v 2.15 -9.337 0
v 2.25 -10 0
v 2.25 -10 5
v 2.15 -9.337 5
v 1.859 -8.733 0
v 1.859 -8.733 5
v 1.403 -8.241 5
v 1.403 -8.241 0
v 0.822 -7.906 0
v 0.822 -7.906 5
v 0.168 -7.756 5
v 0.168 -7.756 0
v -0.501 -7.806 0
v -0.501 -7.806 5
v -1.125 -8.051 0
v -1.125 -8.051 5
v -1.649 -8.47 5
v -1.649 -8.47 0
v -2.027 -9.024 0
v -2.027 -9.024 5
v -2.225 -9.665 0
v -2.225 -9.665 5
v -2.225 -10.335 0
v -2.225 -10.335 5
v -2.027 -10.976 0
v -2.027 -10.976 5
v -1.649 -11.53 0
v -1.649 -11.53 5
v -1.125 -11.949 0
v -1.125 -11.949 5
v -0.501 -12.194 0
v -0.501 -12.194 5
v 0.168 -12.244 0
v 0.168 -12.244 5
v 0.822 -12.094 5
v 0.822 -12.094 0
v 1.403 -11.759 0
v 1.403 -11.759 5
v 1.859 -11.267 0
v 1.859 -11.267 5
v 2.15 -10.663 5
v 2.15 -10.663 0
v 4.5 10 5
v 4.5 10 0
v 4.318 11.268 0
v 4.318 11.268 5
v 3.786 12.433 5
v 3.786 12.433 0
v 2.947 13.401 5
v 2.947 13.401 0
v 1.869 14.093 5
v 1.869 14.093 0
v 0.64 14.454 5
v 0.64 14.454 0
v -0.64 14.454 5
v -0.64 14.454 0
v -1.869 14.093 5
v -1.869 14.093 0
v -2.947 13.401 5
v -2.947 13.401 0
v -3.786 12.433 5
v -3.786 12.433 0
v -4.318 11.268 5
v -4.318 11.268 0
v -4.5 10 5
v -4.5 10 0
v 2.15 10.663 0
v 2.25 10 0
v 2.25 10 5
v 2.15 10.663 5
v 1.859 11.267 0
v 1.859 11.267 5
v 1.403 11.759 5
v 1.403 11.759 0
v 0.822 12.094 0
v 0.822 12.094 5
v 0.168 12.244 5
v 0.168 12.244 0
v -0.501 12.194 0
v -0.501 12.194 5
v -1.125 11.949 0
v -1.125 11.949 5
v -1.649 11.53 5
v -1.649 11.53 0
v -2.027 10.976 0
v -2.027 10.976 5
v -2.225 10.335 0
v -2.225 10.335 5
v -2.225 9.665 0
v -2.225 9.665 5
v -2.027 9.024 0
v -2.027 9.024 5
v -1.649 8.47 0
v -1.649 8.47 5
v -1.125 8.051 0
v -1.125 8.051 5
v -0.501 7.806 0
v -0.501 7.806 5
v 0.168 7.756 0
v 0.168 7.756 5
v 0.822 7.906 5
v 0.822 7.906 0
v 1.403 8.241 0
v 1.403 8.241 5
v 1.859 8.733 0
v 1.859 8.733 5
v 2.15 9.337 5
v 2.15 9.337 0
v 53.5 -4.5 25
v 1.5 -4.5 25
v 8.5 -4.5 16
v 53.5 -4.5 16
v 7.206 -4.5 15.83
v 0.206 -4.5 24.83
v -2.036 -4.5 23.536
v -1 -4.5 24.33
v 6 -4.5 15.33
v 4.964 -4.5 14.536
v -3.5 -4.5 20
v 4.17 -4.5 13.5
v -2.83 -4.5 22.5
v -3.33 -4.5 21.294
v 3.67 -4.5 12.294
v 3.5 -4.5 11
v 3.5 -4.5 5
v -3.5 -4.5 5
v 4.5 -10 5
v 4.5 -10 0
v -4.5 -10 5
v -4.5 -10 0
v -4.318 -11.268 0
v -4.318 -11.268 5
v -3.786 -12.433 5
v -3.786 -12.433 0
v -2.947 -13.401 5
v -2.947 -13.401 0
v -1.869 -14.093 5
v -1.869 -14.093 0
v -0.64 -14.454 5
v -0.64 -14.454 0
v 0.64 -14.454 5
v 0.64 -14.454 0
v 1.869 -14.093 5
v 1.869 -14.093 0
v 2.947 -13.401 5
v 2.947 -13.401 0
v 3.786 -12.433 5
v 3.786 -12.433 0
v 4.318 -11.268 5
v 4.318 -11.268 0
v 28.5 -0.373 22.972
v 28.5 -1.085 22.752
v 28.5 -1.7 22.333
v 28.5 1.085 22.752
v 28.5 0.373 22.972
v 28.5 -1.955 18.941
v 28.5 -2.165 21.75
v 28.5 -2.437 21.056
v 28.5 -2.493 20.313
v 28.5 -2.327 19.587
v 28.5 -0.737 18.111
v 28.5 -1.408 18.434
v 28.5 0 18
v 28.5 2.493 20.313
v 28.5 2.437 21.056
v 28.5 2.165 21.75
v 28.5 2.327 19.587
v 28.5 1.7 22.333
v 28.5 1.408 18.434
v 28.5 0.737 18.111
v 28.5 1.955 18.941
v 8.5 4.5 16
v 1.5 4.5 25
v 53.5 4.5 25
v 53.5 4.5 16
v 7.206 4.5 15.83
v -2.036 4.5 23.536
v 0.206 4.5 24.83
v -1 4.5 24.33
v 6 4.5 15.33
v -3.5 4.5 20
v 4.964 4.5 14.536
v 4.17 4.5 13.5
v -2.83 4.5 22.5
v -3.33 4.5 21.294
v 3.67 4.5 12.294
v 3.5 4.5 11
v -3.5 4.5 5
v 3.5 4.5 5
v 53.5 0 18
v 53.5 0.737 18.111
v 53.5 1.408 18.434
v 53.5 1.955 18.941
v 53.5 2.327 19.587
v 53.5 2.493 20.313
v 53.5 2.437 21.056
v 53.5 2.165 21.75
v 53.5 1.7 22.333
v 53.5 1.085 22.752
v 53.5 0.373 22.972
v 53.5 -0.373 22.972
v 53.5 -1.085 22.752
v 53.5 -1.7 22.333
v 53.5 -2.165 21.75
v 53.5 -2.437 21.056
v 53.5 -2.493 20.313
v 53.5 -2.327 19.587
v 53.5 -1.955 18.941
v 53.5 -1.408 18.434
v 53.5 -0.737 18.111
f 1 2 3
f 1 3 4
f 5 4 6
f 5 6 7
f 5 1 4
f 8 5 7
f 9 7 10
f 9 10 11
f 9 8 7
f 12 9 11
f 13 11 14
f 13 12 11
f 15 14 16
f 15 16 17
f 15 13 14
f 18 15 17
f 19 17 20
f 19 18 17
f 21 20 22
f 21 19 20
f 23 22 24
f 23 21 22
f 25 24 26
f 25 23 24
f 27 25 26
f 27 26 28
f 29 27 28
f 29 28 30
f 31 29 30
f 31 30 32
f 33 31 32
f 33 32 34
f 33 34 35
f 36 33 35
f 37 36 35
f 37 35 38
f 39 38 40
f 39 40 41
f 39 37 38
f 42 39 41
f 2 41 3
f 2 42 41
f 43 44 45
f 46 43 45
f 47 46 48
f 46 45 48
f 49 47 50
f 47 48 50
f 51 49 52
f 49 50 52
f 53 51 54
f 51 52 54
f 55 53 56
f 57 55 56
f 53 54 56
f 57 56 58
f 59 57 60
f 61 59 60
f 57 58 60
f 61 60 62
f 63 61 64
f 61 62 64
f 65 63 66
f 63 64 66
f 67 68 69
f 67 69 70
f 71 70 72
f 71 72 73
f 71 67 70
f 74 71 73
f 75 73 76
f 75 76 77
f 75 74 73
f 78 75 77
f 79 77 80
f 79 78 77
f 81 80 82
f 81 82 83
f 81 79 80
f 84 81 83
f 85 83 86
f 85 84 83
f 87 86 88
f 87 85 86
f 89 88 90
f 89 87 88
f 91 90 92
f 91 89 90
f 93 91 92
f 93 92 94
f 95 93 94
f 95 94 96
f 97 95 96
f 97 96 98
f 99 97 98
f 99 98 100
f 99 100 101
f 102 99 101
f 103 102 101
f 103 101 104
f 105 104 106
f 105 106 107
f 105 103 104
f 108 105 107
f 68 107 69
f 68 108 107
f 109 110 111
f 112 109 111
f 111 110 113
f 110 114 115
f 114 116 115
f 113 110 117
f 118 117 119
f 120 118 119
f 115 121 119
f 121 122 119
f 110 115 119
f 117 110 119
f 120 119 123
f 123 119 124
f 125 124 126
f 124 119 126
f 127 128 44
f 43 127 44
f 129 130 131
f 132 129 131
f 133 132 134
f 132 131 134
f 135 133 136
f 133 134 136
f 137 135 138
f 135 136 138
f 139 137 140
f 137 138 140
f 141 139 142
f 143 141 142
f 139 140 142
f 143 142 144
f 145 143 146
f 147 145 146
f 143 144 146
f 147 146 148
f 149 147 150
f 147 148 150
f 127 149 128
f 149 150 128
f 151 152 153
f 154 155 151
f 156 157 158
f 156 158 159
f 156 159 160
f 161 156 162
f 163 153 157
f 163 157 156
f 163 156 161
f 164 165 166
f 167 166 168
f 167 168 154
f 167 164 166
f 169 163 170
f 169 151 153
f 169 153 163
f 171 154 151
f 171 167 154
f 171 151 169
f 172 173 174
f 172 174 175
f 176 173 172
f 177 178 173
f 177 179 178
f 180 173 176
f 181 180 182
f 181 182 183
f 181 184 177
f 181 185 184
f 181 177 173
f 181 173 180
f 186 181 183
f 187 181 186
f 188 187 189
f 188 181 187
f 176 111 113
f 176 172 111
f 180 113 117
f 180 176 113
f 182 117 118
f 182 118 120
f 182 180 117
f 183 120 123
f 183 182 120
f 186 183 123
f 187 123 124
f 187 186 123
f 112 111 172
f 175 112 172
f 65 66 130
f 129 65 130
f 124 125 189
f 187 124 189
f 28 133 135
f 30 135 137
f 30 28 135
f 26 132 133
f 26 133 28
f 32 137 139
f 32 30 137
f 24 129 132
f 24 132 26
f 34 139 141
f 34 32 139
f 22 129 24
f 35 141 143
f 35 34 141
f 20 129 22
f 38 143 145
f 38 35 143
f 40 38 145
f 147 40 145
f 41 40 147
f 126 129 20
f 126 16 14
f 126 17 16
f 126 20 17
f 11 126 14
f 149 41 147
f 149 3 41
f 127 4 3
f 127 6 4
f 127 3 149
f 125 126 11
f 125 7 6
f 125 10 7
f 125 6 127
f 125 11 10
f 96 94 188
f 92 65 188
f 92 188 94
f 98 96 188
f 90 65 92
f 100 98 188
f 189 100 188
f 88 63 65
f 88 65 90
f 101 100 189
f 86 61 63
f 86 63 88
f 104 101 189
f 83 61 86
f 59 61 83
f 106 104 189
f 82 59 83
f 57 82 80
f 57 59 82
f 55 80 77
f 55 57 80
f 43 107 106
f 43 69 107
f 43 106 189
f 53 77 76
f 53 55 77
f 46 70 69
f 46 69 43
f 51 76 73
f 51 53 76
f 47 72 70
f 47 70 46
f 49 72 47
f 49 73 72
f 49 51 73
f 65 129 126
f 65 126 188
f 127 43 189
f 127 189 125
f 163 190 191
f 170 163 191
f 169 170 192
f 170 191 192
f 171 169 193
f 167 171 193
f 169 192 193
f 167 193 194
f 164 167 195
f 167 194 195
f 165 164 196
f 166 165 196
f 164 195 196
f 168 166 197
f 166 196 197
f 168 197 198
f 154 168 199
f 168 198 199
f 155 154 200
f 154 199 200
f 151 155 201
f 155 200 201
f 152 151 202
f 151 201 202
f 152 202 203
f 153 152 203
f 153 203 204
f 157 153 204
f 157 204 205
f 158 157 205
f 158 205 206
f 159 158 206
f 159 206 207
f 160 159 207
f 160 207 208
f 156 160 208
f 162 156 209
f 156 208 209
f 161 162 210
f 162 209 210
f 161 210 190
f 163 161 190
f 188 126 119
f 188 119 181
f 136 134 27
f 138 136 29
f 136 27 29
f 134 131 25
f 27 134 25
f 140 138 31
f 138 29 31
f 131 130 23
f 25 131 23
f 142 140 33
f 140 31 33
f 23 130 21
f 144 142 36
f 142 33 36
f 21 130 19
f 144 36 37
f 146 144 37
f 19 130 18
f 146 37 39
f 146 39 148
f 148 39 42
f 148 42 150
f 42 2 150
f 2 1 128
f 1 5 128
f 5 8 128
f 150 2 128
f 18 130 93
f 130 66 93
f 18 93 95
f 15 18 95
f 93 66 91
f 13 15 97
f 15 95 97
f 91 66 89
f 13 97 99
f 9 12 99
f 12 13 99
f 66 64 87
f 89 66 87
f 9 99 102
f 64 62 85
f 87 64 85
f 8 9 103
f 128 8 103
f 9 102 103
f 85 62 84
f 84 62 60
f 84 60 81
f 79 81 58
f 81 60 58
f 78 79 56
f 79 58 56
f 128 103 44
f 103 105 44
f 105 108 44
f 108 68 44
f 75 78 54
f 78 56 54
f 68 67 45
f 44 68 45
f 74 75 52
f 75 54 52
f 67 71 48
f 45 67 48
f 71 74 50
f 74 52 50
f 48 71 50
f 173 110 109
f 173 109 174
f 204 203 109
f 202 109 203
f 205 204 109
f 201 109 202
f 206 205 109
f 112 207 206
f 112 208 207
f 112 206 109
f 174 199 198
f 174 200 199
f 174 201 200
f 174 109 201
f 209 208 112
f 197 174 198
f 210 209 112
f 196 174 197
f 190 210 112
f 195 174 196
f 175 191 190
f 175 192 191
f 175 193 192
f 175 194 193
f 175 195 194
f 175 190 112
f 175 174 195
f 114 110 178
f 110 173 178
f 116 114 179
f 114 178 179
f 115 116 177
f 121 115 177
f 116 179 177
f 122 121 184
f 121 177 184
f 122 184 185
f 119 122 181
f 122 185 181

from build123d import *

# Parameters (mm, degrees)
SKETCH1_R           = 2.25
BOSS_EXTRUDE1_DEPTH = 5
SKETCH2_W           = 7
SKETCH2_H           = 9
BOSS_EXTRUDE2_DEPTH = 20
SKETCH4_W           = 9
SKETCH4_H           = 9
BOSS_EXTRUDE4_DEPTH = 50
SKETCH5_R           = 2.5
CUT_EXTRUDE1_DEPTH  = 25
FILLET1_R           = 5
FILLET2_R           = 5


with BuildPart() as part:
    # Sketch1 → Boss-Extrude1 (new body)
    with BuildSketch(Plane.XY):
        with BuildLine():
            ThreePointArc((4.5, 10), (0, 14.5), (-4.5, 10))
            Line((-4.5, 10), (-4.5, -10))
            ThreePointArc((-4.5, -10), (0, -14.5), (4.5, -10))
            Line((4.5, -10), (4.5, 10))
        make_face()
        with Locations((0, 10)):
            Circle(SKETCH1_R, mode=Mode.SUBTRACT)
        with Locations((0, -10)):
            Circle(SKETCH1_R, mode=Mode.SUBTRACT)
    extrude(amount=BOSS_EXTRUDE1_DEPTH)

    # Sketch2 → Boss-Extrude2 (add)
    with BuildSketch(Plane.XY.offset(5)):
        Rectangle(SKETCH2_W, SKETCH2_H)
    extrude(amount=BOSS_EXTRUDE2_DEPTH)

    # Sketch4 → Boss-Extrude4 (add)
    with BuildSketch(Plane(origin=(3.5, 0, 0), x_dir=(0, 0, -1), z_dir=(1, 0, 0))):
        with Locations((-20.5, 0)):
            Rectangle(SKETCH4_W, SKETCH4_H)
    extrude(amount=BOSS_EXTRUDE4_DEPTH)

    # Sketch5 → Cut-Extrude1 (cut)
    with BuildSketch(Plane(origin=(53.5, 0, 0), x_dir=(0, 0, -1), z_dir=(1, 0, 0))):
        with Locations((-20.5, 0)):
            Circle(SKETCH5_R)
    extrude(amount=-CUT_EXTRUDE1_DEPTH, mode=Mode.SUBTRACT)

    # Fillet1
    fillet1_edges = [part.edges().sort_by_distance(p)[0] for p in [
        (3.5, 0, 16),
    ]]
    fillet(fillet1_edges, radius=FILLET1_R)

    # Fillet2
    fillet2_edges = [part.edges().sort_by_distance(p)[0] for p in [
        (-3.5, 0, 25),
    ]]
    fillet(fillet2_edges, radius=FILLET2_R)


solid = part.part
